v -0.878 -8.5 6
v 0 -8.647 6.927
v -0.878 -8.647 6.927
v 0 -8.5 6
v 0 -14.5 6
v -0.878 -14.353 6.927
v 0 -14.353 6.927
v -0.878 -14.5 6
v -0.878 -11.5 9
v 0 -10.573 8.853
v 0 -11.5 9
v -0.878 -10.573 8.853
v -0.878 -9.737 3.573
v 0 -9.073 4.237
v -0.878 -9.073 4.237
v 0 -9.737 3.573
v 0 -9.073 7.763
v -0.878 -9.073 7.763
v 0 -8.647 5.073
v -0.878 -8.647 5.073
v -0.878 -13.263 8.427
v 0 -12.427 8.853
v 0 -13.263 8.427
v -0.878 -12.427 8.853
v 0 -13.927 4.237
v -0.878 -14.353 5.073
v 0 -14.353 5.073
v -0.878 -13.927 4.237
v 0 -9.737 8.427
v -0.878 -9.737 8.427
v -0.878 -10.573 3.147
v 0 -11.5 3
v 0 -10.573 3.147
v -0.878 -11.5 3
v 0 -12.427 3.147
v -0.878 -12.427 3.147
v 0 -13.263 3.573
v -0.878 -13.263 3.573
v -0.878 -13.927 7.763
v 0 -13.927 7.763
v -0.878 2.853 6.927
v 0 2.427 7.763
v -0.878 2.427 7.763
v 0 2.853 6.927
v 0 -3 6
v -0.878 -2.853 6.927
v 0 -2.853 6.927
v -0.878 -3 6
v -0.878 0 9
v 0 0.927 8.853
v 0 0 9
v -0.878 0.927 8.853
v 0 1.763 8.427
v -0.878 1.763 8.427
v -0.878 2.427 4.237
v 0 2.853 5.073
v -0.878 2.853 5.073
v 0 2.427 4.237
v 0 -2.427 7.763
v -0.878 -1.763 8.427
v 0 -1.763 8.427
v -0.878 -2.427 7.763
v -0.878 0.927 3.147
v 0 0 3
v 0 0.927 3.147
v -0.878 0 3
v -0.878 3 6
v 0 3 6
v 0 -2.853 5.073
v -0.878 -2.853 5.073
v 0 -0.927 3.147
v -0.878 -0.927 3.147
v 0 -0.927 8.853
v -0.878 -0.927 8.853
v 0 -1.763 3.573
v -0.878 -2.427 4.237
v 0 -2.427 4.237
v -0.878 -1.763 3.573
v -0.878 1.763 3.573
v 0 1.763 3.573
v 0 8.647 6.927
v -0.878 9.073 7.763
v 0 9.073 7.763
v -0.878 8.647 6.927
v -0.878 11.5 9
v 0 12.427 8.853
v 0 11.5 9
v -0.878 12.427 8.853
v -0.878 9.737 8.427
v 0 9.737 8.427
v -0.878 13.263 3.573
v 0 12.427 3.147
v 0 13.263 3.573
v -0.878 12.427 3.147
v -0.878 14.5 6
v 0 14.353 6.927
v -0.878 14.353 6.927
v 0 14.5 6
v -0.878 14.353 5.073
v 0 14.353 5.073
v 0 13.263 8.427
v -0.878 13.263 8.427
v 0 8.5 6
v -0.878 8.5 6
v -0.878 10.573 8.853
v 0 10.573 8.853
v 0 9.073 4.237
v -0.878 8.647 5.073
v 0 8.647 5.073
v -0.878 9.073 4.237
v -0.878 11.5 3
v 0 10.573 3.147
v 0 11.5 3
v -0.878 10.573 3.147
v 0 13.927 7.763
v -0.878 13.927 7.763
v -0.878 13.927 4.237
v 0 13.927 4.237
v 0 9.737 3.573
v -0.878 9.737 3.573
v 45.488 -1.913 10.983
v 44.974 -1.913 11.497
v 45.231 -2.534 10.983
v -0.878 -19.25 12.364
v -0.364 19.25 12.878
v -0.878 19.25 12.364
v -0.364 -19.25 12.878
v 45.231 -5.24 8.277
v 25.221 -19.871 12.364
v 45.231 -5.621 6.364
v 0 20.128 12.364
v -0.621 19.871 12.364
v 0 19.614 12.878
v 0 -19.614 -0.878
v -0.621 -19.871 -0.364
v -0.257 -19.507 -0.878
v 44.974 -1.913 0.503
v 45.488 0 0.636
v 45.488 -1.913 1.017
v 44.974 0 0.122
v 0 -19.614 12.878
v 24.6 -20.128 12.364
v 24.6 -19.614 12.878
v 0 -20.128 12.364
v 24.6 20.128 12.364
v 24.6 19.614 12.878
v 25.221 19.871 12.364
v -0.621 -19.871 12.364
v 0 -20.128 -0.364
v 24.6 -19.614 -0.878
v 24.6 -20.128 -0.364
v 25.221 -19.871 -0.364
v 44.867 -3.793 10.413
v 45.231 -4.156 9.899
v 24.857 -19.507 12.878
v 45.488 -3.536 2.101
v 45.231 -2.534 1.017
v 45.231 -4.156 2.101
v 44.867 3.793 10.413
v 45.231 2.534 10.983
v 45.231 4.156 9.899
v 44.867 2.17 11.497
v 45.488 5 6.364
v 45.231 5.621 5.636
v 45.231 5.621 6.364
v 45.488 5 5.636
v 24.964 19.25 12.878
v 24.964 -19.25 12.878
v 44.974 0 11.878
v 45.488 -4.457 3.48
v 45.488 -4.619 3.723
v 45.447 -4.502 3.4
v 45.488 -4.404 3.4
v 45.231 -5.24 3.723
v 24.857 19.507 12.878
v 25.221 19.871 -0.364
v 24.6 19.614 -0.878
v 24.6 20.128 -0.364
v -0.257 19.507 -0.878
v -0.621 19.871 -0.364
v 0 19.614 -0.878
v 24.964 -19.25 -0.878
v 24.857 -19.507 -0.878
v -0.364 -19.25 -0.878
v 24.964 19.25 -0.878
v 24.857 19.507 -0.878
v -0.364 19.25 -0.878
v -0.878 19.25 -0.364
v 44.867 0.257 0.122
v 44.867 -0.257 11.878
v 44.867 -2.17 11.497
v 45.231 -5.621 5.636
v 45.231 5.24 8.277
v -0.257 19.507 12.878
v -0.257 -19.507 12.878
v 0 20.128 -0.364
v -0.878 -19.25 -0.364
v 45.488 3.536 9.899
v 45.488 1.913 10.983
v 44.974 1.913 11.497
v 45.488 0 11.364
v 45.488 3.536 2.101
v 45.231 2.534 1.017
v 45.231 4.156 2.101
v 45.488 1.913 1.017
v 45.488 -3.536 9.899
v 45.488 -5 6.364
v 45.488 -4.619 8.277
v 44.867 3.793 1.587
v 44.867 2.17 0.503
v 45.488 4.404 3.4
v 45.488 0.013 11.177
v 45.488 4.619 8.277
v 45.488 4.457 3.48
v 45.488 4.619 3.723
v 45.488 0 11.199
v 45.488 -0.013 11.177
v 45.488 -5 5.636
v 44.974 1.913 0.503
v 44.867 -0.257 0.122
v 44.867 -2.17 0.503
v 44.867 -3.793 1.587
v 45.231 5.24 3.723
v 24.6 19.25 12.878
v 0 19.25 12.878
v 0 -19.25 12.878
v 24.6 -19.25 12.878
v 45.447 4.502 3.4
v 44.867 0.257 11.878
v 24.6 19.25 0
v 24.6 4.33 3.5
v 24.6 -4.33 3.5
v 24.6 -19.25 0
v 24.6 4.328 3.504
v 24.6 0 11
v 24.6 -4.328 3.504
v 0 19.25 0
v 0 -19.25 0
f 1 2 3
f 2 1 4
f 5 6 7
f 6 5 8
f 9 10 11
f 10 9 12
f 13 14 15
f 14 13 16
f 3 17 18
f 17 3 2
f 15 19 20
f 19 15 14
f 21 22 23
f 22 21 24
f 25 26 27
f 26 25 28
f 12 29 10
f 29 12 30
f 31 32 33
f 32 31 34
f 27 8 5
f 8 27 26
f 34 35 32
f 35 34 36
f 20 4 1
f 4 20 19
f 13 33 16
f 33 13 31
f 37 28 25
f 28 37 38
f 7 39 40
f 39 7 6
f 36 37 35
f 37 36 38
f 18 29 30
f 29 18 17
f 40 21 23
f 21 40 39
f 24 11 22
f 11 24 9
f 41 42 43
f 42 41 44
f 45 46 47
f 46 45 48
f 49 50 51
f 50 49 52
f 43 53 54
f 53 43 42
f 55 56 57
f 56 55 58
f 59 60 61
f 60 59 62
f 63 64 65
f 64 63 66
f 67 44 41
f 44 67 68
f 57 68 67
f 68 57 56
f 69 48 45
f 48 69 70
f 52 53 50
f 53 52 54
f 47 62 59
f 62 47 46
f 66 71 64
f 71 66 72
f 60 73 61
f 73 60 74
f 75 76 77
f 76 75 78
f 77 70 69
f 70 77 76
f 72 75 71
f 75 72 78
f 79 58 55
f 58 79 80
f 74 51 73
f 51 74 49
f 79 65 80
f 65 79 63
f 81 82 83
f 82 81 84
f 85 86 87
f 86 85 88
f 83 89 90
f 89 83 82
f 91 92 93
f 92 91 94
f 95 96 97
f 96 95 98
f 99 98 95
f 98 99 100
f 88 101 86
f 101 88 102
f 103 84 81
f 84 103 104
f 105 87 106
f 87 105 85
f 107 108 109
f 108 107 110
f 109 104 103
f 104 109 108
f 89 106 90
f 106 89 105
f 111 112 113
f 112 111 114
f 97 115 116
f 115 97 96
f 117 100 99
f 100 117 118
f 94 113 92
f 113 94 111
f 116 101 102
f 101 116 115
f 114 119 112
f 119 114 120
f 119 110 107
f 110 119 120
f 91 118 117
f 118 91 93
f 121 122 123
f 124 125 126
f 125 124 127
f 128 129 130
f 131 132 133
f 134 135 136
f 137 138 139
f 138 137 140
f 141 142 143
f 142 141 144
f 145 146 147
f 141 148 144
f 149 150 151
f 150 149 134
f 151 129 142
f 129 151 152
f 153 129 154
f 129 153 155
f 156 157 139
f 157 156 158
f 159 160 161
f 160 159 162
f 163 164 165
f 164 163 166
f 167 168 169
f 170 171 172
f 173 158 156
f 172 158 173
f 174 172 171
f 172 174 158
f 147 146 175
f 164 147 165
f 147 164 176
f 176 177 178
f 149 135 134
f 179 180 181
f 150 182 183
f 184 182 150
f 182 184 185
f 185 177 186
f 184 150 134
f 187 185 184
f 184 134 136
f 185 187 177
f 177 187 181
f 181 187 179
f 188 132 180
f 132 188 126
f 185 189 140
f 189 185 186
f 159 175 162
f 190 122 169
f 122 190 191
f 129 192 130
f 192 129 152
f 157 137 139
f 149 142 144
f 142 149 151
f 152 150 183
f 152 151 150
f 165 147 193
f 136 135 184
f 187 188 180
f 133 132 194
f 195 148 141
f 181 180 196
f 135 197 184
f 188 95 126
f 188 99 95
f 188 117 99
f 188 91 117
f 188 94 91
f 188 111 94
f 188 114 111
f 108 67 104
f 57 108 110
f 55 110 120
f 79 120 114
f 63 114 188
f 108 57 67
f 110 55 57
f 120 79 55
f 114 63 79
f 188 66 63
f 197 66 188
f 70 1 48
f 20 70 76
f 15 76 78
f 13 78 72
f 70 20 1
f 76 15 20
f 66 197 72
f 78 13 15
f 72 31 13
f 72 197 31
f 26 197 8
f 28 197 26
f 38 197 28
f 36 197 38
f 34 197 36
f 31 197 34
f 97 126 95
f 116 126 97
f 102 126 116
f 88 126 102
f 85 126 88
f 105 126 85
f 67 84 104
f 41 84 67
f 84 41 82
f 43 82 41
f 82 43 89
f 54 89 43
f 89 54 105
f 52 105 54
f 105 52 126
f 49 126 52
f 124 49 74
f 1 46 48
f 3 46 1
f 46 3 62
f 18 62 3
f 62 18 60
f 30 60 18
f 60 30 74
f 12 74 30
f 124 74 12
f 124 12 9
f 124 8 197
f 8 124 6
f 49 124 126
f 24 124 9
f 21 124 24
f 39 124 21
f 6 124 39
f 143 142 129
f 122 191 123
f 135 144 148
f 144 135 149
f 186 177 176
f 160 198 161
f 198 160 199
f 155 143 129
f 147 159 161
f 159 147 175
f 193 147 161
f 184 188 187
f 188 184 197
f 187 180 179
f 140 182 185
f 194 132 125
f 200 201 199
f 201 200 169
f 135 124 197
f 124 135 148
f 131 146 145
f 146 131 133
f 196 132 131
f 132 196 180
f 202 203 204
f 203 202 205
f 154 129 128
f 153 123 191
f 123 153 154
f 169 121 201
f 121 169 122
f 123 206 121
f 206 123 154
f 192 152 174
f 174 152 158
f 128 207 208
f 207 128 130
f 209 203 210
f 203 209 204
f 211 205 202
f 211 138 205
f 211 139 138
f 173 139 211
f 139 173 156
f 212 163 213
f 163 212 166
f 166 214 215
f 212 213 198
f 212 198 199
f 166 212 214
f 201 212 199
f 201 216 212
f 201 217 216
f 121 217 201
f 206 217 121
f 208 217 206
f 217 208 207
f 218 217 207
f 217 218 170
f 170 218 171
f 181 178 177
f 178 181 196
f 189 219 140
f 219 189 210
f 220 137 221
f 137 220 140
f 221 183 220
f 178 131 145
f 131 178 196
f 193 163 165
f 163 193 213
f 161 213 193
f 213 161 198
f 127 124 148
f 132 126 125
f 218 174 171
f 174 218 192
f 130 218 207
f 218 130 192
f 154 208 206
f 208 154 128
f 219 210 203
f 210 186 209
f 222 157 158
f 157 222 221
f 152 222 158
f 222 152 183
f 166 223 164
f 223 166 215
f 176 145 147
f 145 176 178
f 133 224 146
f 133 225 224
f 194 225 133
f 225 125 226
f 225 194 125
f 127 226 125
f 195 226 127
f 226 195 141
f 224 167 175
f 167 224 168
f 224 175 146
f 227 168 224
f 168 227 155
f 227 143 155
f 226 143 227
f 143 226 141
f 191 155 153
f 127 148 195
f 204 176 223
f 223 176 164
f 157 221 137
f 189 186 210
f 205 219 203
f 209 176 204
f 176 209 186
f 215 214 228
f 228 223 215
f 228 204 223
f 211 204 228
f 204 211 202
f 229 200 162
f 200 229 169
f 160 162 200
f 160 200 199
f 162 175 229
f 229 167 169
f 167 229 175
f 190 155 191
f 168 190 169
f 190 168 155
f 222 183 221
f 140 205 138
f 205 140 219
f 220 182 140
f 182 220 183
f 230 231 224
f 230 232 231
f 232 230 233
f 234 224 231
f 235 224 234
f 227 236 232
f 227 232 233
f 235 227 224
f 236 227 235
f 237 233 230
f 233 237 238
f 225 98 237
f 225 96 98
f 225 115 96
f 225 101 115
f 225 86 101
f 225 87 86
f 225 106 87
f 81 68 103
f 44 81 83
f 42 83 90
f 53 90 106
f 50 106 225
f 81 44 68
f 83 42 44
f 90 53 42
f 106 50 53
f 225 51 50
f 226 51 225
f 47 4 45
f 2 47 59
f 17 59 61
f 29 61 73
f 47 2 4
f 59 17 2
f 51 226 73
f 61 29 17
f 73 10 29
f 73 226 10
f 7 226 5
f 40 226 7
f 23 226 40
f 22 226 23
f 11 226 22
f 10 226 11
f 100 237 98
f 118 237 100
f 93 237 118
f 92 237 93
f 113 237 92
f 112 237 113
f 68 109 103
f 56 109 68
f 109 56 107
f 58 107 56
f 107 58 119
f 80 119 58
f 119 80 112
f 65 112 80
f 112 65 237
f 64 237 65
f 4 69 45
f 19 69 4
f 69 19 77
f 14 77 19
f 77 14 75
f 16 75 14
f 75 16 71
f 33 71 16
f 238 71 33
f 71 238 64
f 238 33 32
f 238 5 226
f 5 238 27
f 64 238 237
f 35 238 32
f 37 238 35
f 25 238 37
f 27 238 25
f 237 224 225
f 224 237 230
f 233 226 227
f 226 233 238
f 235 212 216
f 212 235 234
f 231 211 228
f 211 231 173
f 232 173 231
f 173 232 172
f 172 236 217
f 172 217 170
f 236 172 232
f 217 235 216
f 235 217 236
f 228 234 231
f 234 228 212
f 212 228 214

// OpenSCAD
diameter = 40;
slot_width = 3;
slot_depth = 3;
sphere_resolution = 120;
handle_diameter = 10;
handle_wall = 1;
handle_facets = 3;
handle_middle_length = 100;

epsilon = 0.01;
facet_epsilon = 10;
bigger = 100;
corner_angle = asin(1/sqrt(3));

handle_socket_taper_large = handle_diameter + 0.4;
handle_socket_taper_small = handle_diameter;
handle_shaft_length = handle_middle_length + diameter * 0.75;

//plate();
junction_box();

module plate() {
    half(true);
    translate([diameter + 5, 0, 0]) half(false);
    translate([0, (diameter + handle_diameter) / 2 + 5, 0]) handle();
    translate([-diameter - 5, 0, 0]) junction_box();
}

module handle() {
    translate([0, 0, cos(60) * handle_diameter / 2])
    rotate([0, -90, 0]) {
        difference() {
            cylinder(d=handle_diameter, h=handle_shaft_length, $fn=handle_facets, center=true);
            cylinder(
                d=handle_diameter - handle_wall * 2,
                h=handle_shaft_length + epsilon * 2,
                $fn=handle_facets,
                center=true);
        }
    }
}

module handle_hole(h, taper_1, taper_2, center=false) {
    cylinder(
        d1=taper_1 ? handle_socket_taper_small : handle_socket_taper_large,
        d2=taper_2 ? handle_socket_taper_small : handle_socket_taper_large,
        h=h,
        $fn=handle_facets,
        center=center);
}

module half(is_top_half) {
    difference() {
        rotate([0, 0, is_top_half ? 0 : 180])  // align coil slots given handle hole
        coil_sphere(is_top_half);

        // remove opposite half
        mirror([0, 0, 1])
        top_half_enclosing();
        
        // punch hole for handle
        translate([0, 0, -epsilon])
        rotate([0, 0, -30])
        handle_hole(diameter / 2 + epsilon * 2, false, is_top_half);
    }
}


module coil_sphere(include_entry) {
    difference() {
        sphere(d=diameter, $fn=sphere_resolution);
        
        coil_slot_and_entry(include_entry);
        rotate([0, 0, 120]) coil_slot_and_entry(include_entry);
        rotate([0, 0, -120]) coil_slot_and_entry(include_entry);
    }
}

module coil_slot() {
    linear_extrude(slot_width, center=true, $fn=sphere_resolution, convexity=3)
    difference() {
        circle(d=diameter + facet_epsilon);
        circle(d=diameter - slot_depth);
    }
}

module coil_slot_and_entry(include_entry) {
    rotate([90 - corner_angle, 0, 0])
    coil_slot();
    
    if (include_entry)
    render()  // faster preview
    intersection() {
        // perpendicular slot
        rotate([0, 90, 0]) coil_slot();
        
        // cut part "below" main slot
        rotate([90 - corner_angle, 0, 0])
        top_half_enclosing();
        
        // cut part beyond the middle
        rotate([-90, 0, 0]) top_half_enclosing();
    }
}

module top_half_enclosing() {
    cylinder(d=diameter * 2, h=diameter, $fn=4);
}

module junction_box() {
    // coordinates: length/x, width/y, height/z
    // jack drawing: Kycon STPX-3501-3C-1 https://www.mouser.com/datasheet/2/222/Kycon_01262018_STPX-3501-3C-1-1283208.pdf
    box_side_wall = 0.95;
    jack_unit_spacing = 10.5 /* datasheet body size, shield terminal removed */ + 1 /* fudge */;
    jack_depth = 9 + 5.60 /* from datasheet */;
    jack_panel_hole = 6;
    jack_count = 3;
    width_margin = 1;
    length_margin = 10;
    shell_taper_length = 20;
    box_interior_width = (jack_unit_spacing + width_margin) * jack_count + width_margin;
    box_interior_length = jack_depth + length_margin;
    box_exterior_width = box_interior_width + box_side_wall * 2;
    box_exterior_length = box_interior_length + box_side_wall * 2;
    box_height = 12;  // not bothering to calculate minimum
    
    translate([0, 0, box_height / 2])
    difference() {
        minkowski() {
            sphere(r=box_side_wall, $fn=8);
            
            hull() {
                jack_volume_form();
                
                translate([box_interior_length + shell_taper_length, 0, 0])
                rotate([0, 90, 0])
                cylinder(d=handle_diameter, h=epsilon);
            }
        }
        
        jack_volume_form();
        
        // cut off top TEMPORARY FOR DEVELOPMENT we need a real panel eventually
        translate([0, 0, 10]) jack_volume_form();
        
        // jack holes
        for (i = [-1:1]) {
            translate([epsilon, i * jack_unit_spacing, 0])
            rotate([0, -90, 0])
            cylinder(d=jack_panel_hole, h=box_side_wall * 3, $fn=20);
        }
        
        translate([box_interior_length - epsilon, 0, 0])
        mirror([1, 0, 0])
        rotate([0, -90, 0])
        handle_hole(shell_taper_length + box_side_wall + epsilon, true, false);
    }
    
    module jack_volume_form() {
        translate([0, -box_interior_width / 2, -box_height / 2])
        cube([box_interior_length, box_interior_width, box_height]);
    }
}
